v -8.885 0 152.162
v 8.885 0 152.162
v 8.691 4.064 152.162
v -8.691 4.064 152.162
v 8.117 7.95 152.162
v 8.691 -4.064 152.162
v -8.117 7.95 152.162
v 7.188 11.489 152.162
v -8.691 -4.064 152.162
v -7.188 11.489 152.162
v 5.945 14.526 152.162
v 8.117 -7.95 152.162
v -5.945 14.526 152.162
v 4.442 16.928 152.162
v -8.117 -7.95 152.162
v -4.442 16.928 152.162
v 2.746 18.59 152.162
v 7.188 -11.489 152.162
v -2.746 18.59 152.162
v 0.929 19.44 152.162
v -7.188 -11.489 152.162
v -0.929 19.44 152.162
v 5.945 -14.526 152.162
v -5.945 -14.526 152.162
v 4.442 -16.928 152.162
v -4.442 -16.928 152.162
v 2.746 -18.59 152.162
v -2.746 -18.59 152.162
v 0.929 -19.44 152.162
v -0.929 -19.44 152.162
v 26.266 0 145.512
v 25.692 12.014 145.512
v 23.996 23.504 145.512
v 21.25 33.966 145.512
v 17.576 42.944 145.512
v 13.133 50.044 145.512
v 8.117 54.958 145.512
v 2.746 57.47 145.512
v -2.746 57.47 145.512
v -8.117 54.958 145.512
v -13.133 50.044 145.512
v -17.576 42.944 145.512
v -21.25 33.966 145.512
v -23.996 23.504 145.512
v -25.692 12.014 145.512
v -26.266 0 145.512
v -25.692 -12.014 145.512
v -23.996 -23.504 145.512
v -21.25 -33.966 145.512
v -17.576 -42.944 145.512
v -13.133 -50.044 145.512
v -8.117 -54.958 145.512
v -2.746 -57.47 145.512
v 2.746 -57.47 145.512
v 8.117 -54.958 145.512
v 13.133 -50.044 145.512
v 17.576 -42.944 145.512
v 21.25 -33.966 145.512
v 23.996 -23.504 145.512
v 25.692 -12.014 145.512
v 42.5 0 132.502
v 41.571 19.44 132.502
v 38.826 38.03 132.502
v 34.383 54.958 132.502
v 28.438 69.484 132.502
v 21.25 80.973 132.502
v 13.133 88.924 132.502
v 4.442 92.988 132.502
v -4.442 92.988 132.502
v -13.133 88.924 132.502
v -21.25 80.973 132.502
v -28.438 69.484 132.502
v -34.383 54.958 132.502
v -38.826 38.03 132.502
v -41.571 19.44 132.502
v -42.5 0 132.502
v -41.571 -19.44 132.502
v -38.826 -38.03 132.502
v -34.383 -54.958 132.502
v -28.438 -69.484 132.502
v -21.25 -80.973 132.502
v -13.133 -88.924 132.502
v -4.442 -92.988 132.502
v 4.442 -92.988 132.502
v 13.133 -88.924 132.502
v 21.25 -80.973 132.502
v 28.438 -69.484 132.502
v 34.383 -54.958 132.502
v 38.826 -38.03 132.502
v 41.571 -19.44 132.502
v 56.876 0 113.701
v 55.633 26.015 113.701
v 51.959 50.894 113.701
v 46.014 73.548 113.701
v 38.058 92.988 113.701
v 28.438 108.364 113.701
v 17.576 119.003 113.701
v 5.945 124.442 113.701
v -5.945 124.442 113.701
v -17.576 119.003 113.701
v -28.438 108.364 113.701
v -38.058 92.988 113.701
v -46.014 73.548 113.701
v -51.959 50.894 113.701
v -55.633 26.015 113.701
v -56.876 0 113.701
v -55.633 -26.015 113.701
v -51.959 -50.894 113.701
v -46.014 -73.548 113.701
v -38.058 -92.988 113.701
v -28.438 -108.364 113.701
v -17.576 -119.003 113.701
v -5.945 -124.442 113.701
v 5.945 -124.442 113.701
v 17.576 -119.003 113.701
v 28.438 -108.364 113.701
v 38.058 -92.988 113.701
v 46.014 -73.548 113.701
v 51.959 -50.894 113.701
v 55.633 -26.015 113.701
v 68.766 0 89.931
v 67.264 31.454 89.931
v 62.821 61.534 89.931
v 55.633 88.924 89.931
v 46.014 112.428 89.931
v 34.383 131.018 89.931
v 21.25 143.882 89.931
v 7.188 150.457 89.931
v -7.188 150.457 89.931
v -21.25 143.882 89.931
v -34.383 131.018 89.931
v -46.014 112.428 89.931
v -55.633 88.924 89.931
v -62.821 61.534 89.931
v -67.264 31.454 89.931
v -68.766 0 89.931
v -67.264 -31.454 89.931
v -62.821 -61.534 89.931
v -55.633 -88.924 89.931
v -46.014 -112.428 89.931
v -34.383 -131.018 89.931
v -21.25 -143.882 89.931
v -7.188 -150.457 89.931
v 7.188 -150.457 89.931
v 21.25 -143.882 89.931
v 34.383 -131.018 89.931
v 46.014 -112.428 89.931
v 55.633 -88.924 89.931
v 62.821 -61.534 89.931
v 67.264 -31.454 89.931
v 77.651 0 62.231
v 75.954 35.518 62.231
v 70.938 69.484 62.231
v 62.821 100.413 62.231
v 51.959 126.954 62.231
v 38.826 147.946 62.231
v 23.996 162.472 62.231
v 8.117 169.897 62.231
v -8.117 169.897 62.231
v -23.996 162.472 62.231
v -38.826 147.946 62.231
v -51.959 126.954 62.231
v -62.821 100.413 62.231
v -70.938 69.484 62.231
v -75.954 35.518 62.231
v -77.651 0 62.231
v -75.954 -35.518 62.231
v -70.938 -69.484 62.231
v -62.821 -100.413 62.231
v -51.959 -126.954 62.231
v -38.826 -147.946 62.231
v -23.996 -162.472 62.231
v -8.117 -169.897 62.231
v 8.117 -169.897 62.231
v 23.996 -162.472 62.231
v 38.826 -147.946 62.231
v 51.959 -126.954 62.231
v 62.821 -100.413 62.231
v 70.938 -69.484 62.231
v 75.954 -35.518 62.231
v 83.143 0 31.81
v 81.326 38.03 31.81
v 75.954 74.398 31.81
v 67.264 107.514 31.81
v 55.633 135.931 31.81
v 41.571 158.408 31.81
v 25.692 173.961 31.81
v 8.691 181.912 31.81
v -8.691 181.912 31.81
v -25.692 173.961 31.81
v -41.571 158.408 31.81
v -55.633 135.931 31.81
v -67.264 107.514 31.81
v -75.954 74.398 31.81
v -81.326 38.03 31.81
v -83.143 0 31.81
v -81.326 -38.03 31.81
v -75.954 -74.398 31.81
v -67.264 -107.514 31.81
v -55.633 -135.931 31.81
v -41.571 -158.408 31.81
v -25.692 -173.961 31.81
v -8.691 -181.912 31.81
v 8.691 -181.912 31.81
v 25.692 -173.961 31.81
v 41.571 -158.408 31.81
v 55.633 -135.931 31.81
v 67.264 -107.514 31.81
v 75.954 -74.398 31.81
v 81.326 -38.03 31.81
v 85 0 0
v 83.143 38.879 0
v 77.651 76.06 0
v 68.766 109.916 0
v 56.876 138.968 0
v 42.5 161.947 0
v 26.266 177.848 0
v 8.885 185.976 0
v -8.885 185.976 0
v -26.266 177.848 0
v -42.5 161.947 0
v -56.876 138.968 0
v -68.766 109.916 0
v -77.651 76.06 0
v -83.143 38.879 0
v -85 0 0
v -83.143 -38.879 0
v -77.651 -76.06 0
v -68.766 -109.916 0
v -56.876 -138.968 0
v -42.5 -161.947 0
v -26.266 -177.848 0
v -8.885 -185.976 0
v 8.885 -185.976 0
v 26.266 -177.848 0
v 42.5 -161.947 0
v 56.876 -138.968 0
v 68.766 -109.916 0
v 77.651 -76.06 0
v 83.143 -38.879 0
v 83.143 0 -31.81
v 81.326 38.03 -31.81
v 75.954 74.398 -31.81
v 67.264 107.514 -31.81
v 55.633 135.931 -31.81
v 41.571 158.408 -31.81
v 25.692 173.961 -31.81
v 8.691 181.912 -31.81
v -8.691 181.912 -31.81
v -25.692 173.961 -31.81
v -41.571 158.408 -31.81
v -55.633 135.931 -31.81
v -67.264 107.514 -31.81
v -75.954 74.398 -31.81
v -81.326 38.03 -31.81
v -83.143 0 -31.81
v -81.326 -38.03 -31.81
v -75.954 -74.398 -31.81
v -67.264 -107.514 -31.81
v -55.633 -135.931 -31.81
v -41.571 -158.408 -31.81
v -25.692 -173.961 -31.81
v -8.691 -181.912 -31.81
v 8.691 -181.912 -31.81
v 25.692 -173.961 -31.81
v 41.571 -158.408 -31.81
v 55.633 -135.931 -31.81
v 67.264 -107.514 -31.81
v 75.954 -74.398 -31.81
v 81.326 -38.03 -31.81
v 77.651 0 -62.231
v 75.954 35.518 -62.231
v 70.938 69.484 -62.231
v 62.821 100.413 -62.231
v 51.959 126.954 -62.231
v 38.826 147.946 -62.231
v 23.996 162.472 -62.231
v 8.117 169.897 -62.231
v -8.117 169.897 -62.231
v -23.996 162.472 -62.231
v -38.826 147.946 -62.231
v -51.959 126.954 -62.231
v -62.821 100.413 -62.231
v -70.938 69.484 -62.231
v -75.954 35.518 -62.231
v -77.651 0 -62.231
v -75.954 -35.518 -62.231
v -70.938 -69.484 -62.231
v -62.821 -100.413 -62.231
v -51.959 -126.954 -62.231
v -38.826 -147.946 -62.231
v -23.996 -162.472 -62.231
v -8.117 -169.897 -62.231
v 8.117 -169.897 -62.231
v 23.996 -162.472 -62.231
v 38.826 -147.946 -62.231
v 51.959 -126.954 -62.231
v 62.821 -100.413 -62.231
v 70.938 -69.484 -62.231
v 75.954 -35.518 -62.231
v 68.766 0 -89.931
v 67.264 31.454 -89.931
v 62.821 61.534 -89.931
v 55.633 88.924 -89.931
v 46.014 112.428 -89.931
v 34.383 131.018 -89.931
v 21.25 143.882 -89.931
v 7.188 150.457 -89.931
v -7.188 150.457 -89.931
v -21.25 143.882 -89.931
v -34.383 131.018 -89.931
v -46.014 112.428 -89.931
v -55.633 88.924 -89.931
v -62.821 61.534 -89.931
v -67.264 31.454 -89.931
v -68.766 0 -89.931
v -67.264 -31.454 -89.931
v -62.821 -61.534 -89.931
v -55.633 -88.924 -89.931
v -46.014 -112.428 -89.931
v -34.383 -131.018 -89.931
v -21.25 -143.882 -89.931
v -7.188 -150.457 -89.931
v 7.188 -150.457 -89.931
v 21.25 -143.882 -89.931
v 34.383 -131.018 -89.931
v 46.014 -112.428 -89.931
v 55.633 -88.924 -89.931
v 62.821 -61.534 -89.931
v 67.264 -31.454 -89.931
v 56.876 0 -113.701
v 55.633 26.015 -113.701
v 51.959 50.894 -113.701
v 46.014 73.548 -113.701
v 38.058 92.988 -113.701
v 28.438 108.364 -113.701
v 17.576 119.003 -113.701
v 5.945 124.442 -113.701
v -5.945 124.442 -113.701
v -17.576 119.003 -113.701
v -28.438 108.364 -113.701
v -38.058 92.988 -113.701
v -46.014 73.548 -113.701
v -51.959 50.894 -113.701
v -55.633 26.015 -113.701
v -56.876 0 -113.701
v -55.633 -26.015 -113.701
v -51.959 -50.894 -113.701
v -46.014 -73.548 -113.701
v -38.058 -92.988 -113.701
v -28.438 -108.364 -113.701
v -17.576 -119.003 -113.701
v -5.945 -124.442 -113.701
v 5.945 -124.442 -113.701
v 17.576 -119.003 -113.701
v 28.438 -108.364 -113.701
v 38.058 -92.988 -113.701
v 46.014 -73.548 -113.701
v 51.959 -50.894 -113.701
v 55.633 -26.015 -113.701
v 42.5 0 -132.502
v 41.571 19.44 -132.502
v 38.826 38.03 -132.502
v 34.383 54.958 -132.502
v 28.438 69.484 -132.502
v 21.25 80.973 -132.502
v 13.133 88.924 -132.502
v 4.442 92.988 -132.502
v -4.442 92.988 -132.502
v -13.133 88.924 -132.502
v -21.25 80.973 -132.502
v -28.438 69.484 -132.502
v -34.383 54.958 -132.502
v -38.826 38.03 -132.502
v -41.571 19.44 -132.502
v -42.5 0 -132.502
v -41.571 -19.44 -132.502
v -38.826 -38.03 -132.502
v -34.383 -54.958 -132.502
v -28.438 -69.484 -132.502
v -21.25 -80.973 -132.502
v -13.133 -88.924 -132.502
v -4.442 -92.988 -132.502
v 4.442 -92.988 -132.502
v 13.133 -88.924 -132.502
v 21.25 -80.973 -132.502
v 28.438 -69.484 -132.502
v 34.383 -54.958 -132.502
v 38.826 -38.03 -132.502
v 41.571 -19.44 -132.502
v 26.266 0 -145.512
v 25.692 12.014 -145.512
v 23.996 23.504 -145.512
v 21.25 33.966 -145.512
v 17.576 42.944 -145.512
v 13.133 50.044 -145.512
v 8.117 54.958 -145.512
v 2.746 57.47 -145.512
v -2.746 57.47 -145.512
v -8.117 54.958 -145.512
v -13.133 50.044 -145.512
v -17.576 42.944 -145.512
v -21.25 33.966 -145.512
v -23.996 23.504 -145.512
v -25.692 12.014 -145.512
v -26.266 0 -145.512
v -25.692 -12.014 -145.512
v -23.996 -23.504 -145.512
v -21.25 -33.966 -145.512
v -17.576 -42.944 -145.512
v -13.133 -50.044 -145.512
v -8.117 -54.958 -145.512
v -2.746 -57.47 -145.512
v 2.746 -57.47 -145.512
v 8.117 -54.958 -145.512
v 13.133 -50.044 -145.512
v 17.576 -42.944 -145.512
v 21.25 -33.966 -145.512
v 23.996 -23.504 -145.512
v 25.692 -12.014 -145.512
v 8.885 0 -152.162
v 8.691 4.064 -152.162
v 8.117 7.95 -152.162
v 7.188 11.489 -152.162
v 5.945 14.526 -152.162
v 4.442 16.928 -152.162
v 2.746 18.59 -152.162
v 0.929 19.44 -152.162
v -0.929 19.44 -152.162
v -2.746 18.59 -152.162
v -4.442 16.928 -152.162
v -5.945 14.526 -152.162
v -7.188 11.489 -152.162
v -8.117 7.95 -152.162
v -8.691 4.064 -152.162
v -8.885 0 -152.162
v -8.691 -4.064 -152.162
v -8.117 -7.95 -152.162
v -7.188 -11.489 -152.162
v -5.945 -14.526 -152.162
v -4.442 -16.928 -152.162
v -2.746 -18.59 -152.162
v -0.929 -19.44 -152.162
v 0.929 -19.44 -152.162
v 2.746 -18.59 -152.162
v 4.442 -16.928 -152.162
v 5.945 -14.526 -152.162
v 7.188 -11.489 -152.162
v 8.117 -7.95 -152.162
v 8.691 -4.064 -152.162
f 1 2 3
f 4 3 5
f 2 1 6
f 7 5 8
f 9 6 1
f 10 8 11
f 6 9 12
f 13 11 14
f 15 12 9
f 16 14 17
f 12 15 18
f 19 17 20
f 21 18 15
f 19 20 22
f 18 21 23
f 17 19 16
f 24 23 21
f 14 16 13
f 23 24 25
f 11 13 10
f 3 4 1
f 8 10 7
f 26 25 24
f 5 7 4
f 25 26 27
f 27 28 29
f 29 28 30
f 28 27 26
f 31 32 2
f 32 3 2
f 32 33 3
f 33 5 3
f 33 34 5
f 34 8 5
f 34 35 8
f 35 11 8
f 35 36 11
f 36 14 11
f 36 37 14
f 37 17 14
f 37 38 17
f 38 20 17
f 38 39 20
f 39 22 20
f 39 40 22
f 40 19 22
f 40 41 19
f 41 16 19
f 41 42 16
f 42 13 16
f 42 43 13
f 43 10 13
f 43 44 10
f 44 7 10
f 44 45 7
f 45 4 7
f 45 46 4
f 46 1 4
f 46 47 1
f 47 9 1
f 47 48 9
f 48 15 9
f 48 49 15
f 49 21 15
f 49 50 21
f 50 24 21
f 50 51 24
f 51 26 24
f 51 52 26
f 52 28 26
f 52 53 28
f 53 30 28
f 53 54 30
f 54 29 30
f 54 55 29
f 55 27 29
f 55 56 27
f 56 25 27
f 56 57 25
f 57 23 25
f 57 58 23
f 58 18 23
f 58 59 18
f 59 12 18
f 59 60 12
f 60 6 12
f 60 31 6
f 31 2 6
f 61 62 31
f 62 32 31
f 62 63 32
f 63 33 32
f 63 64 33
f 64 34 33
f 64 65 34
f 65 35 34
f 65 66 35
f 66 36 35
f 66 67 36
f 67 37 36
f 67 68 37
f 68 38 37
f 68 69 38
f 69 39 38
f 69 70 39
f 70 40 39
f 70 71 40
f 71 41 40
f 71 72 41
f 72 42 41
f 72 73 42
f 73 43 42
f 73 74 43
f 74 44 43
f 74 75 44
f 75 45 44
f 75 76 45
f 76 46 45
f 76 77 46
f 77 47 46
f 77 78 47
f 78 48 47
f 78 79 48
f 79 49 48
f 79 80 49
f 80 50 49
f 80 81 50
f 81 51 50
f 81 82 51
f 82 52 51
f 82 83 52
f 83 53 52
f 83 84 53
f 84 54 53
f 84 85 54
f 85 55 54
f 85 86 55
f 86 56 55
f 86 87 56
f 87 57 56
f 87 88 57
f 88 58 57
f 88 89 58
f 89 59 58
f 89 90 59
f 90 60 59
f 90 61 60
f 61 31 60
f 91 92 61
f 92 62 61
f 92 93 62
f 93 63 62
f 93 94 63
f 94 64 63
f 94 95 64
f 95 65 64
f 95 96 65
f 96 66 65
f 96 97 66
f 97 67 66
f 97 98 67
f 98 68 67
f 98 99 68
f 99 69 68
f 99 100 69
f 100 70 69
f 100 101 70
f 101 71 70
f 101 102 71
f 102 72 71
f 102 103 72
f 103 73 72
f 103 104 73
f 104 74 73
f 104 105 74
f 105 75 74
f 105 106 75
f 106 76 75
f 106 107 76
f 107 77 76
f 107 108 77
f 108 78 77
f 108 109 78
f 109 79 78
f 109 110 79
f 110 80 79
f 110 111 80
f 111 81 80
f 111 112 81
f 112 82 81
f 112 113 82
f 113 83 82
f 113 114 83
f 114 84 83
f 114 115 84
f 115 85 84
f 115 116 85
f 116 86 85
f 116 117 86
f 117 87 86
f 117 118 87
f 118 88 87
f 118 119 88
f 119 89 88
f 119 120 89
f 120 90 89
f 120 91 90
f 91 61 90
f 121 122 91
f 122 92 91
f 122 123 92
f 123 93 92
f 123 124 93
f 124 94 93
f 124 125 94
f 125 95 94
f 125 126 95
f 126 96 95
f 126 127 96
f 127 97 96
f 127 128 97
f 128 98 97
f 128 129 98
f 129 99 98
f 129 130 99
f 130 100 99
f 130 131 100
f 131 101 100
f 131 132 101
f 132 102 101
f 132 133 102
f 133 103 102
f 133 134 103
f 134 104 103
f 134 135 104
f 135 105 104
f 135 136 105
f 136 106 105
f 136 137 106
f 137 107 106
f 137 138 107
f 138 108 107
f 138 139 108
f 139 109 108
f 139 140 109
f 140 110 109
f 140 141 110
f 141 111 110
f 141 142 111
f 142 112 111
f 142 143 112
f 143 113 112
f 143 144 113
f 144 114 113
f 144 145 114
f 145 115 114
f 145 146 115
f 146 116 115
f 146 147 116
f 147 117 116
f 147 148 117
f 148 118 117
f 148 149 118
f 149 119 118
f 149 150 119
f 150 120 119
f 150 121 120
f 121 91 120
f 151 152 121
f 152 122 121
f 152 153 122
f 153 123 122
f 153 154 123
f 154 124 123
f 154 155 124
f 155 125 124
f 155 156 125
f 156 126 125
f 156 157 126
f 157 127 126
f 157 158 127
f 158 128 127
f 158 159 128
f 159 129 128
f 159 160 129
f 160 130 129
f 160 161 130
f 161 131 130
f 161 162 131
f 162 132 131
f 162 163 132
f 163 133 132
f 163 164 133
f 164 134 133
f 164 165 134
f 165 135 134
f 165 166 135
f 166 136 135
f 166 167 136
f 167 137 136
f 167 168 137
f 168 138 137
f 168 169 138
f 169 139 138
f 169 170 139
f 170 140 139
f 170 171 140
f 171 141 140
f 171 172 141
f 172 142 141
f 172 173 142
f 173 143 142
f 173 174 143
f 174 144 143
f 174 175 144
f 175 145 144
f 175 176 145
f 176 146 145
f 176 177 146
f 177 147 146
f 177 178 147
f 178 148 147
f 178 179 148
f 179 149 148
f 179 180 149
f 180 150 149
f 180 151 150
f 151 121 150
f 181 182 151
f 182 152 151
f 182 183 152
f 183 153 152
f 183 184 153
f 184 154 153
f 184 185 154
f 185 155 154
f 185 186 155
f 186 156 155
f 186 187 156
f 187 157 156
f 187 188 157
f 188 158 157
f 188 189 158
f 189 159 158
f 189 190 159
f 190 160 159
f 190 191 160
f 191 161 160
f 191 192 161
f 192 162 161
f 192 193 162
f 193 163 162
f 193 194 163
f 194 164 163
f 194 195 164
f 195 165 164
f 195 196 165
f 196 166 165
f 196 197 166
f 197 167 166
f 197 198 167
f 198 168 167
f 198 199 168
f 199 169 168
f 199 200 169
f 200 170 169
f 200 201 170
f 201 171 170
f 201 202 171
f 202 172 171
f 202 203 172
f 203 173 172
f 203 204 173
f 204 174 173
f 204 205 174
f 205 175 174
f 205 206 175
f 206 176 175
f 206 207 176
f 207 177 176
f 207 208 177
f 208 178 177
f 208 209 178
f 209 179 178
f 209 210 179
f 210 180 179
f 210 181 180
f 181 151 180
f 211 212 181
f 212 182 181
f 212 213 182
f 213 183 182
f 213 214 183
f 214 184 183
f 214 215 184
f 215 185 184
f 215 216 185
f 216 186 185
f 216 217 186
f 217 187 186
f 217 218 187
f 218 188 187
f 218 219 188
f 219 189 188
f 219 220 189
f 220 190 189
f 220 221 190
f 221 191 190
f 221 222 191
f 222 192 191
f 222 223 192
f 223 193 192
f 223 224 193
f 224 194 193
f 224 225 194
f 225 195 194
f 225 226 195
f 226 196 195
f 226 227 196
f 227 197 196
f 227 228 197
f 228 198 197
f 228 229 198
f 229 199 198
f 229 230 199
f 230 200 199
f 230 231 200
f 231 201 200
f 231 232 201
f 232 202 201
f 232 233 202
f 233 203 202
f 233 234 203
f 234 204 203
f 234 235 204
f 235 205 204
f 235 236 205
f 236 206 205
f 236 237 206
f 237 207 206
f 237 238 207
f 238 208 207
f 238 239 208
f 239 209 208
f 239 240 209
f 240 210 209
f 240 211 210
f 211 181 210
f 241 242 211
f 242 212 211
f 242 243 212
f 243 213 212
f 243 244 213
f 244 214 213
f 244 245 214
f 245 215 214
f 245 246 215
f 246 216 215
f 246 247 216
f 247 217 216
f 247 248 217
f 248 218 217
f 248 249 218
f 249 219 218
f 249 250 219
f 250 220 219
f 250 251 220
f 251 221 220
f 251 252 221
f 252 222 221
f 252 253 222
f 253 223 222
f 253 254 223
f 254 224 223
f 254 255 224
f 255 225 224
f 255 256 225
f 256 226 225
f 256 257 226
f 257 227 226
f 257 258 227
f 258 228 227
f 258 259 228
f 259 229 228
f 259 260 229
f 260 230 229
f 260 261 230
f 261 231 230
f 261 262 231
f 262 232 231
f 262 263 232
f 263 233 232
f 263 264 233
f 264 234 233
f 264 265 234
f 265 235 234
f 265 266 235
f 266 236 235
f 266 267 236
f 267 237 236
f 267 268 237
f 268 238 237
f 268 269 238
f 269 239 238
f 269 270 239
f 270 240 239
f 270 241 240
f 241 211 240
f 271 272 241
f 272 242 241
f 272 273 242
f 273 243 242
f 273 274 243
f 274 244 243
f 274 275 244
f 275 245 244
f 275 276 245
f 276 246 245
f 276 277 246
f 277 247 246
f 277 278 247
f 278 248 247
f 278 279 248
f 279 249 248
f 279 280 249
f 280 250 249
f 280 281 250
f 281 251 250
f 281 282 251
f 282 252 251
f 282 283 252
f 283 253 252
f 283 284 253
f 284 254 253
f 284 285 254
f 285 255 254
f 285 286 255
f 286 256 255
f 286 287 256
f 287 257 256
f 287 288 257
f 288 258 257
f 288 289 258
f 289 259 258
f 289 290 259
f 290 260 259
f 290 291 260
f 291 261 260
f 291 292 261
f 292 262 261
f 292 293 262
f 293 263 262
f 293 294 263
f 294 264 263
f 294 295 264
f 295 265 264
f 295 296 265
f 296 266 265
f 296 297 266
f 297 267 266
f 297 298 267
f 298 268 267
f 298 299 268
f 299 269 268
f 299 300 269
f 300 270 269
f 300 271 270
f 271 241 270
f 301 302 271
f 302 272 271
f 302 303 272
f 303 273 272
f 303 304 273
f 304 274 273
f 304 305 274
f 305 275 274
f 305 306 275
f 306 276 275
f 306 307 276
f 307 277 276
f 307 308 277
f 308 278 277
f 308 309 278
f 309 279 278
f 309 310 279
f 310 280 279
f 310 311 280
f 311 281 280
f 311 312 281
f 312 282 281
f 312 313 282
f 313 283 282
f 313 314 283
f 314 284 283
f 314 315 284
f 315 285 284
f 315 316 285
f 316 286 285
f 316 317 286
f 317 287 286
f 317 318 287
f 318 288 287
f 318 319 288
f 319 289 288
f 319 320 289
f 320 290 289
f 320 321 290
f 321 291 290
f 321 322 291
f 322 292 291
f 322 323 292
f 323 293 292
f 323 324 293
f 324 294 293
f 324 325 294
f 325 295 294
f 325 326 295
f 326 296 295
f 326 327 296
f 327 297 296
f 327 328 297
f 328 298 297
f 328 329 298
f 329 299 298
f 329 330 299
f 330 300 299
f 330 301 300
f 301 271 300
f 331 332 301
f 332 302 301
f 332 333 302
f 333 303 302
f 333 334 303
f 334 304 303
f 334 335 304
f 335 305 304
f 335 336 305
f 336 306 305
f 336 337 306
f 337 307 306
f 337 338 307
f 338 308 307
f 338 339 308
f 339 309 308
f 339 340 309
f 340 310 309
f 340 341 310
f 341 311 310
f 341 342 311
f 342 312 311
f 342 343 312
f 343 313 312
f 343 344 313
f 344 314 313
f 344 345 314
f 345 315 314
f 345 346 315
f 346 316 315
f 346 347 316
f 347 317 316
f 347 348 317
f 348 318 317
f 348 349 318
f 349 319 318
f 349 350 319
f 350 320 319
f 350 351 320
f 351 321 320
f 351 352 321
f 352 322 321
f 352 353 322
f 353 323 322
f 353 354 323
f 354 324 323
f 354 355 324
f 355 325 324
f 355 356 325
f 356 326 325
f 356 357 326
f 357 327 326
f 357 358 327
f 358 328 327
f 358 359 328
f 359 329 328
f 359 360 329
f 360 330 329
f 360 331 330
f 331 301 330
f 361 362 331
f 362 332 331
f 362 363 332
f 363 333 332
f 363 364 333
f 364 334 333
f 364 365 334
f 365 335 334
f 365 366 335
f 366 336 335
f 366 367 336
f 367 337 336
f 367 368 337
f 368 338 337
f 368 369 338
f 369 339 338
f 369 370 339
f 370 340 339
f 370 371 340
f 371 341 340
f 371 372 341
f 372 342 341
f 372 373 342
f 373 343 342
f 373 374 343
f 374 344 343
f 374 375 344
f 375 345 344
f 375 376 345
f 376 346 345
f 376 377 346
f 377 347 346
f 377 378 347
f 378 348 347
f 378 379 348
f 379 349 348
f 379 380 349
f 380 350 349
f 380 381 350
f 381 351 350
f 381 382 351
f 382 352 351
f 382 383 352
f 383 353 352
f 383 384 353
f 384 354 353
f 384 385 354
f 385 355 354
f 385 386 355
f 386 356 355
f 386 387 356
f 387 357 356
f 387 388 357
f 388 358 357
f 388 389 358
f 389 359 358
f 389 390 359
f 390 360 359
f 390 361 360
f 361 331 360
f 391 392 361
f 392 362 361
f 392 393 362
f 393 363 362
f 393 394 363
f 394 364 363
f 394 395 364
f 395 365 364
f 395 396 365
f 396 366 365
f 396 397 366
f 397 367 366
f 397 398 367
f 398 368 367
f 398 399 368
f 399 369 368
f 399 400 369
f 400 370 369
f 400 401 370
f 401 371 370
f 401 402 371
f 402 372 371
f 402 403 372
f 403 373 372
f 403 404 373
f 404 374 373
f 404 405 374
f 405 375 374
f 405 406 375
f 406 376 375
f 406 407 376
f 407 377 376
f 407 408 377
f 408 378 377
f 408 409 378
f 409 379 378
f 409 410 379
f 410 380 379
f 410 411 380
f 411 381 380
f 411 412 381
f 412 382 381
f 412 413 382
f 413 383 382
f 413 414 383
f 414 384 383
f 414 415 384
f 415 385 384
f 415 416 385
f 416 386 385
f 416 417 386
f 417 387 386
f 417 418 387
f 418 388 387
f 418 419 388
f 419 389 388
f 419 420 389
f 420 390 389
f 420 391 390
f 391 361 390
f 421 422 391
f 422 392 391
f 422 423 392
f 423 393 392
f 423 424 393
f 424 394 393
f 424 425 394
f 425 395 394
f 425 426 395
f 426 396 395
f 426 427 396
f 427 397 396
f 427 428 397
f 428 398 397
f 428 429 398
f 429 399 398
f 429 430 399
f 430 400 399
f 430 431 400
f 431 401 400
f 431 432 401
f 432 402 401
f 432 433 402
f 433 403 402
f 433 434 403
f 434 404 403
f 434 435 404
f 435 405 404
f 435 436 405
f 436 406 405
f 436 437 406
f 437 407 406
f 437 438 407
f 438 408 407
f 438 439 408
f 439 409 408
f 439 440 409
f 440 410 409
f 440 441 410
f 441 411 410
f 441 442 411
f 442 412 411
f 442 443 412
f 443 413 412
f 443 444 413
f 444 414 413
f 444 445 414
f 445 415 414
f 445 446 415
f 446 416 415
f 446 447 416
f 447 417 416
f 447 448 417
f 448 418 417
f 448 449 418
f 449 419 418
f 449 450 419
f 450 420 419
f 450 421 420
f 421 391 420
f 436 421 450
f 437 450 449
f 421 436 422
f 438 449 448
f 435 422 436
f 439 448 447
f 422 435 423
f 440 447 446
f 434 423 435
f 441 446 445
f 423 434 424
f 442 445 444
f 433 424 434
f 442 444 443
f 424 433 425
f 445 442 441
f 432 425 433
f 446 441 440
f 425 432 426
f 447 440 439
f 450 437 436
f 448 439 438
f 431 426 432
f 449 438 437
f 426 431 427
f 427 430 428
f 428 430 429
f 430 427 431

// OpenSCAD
// Generated by SolidPython 1.0.1 on 2020-07-29 00:46:46


scale(v = [5, 11, 9]) {
	sphere(r = 17);
}
/***********************************************
*********      SolidPython code:      **********
************************************************
 
# import packages: SolidPython
from solid import *
from solid.utils import *
from itertools import chain, combinations, permutations


class Resize:

    def __init__(self, scad_file):
        self.scad_file = scad_file
        #self.scad_file = import_scad(scad_file)
        # cone/cylinder param:
        self.r1 = 0
        self.r2 = 0
        self.h = 0
        # rectangular prism param:
        self.w = 0
        self.l = 0
        # ellipse param:
        self.r = 0

    # import OpenScad code (file name corresponds to shape)


    # classify shape + parameters
    def assign(self, param1, param2, param3):
        if self.scad_file == 'cone.scad':
            self.r1 = param1
            self.r2 = param2
            self.h = param3
        elif self.scad_file == 'cylinder.scad':
            self.r1 = param1
            self.r2 = param2
            self.h = param3
        elif self.scad_file == 'rectangularPrism.scad':
            self.h = param1
            self.l = param2
            self.w = param3
        else:
            self.r = param1
            self.h = param2

    # resize parameters
    def iterate(self):
        x = range(3, 20, 2)
        i = 1
        if self.scad_file == 'cone.scad':
            tempList = list(permutations(x, 2))
            for temp in tempList:
                param1 = temp[0]
                param2 = temp[1]
                filepath = 'produced_scad_files/' + 'cone' + str(param1) + '_' + str(param2) + '_' + '.scad'
                scad_render_to_file(cylinder(h=param1, r1=param2, r2=0), filepath)

        elif self.scad_file == 'cylinder.scad':
            tempList = list(permutations(x, 3))
            for temp in tempList:
                param1 = temp[0]
                param2 = temp[1]
                filepath = 'produced_scad_files/' + 'cylinder' + str(param1) + '_' + str(param2) + '_' + '.scad'
                scad_render_to_file(cylinder(h=param1, r1=param2, r2=param2), filepath)

        elif self.scad_file == 'rectangularPrism.scad':
            tempList = list(permutations(x, 3))
            for temp in tempList:
                param1 = temp[0]
                param2 = temp[1]
                param3 = temp[2]
                filepath = 'produced_scad_files/' + 'rectangularPrism' + str(param1) + '_' + str(param2) + '_' + str(
                    param3) + '.scad'
                scad_render_to_file(cube(size=(param1, param2, param3)), filepath)

        elif self.scad_file == 'ellipse.scad':
            tempList = list(permutations(x, 4))
            for temp in tempList:
                param1 = temp[0]
                param2 = temp[1]
                param3 = temp[2]
                param4 = temp[3]
                filepath = 'produced_scad_files/' + 'ellipse' + str(param1) + '_' + str(param2) + '_' + str(param3) + '_' + str(param4) + '.scad'
                scad_render_to_file(scale([param1, param2, param3])(sphere(r=param4)), filepath)

    def render_to_scadfile(self):
        scad_render_to_file(scad, 'example.scad') 
 
************************************************/
